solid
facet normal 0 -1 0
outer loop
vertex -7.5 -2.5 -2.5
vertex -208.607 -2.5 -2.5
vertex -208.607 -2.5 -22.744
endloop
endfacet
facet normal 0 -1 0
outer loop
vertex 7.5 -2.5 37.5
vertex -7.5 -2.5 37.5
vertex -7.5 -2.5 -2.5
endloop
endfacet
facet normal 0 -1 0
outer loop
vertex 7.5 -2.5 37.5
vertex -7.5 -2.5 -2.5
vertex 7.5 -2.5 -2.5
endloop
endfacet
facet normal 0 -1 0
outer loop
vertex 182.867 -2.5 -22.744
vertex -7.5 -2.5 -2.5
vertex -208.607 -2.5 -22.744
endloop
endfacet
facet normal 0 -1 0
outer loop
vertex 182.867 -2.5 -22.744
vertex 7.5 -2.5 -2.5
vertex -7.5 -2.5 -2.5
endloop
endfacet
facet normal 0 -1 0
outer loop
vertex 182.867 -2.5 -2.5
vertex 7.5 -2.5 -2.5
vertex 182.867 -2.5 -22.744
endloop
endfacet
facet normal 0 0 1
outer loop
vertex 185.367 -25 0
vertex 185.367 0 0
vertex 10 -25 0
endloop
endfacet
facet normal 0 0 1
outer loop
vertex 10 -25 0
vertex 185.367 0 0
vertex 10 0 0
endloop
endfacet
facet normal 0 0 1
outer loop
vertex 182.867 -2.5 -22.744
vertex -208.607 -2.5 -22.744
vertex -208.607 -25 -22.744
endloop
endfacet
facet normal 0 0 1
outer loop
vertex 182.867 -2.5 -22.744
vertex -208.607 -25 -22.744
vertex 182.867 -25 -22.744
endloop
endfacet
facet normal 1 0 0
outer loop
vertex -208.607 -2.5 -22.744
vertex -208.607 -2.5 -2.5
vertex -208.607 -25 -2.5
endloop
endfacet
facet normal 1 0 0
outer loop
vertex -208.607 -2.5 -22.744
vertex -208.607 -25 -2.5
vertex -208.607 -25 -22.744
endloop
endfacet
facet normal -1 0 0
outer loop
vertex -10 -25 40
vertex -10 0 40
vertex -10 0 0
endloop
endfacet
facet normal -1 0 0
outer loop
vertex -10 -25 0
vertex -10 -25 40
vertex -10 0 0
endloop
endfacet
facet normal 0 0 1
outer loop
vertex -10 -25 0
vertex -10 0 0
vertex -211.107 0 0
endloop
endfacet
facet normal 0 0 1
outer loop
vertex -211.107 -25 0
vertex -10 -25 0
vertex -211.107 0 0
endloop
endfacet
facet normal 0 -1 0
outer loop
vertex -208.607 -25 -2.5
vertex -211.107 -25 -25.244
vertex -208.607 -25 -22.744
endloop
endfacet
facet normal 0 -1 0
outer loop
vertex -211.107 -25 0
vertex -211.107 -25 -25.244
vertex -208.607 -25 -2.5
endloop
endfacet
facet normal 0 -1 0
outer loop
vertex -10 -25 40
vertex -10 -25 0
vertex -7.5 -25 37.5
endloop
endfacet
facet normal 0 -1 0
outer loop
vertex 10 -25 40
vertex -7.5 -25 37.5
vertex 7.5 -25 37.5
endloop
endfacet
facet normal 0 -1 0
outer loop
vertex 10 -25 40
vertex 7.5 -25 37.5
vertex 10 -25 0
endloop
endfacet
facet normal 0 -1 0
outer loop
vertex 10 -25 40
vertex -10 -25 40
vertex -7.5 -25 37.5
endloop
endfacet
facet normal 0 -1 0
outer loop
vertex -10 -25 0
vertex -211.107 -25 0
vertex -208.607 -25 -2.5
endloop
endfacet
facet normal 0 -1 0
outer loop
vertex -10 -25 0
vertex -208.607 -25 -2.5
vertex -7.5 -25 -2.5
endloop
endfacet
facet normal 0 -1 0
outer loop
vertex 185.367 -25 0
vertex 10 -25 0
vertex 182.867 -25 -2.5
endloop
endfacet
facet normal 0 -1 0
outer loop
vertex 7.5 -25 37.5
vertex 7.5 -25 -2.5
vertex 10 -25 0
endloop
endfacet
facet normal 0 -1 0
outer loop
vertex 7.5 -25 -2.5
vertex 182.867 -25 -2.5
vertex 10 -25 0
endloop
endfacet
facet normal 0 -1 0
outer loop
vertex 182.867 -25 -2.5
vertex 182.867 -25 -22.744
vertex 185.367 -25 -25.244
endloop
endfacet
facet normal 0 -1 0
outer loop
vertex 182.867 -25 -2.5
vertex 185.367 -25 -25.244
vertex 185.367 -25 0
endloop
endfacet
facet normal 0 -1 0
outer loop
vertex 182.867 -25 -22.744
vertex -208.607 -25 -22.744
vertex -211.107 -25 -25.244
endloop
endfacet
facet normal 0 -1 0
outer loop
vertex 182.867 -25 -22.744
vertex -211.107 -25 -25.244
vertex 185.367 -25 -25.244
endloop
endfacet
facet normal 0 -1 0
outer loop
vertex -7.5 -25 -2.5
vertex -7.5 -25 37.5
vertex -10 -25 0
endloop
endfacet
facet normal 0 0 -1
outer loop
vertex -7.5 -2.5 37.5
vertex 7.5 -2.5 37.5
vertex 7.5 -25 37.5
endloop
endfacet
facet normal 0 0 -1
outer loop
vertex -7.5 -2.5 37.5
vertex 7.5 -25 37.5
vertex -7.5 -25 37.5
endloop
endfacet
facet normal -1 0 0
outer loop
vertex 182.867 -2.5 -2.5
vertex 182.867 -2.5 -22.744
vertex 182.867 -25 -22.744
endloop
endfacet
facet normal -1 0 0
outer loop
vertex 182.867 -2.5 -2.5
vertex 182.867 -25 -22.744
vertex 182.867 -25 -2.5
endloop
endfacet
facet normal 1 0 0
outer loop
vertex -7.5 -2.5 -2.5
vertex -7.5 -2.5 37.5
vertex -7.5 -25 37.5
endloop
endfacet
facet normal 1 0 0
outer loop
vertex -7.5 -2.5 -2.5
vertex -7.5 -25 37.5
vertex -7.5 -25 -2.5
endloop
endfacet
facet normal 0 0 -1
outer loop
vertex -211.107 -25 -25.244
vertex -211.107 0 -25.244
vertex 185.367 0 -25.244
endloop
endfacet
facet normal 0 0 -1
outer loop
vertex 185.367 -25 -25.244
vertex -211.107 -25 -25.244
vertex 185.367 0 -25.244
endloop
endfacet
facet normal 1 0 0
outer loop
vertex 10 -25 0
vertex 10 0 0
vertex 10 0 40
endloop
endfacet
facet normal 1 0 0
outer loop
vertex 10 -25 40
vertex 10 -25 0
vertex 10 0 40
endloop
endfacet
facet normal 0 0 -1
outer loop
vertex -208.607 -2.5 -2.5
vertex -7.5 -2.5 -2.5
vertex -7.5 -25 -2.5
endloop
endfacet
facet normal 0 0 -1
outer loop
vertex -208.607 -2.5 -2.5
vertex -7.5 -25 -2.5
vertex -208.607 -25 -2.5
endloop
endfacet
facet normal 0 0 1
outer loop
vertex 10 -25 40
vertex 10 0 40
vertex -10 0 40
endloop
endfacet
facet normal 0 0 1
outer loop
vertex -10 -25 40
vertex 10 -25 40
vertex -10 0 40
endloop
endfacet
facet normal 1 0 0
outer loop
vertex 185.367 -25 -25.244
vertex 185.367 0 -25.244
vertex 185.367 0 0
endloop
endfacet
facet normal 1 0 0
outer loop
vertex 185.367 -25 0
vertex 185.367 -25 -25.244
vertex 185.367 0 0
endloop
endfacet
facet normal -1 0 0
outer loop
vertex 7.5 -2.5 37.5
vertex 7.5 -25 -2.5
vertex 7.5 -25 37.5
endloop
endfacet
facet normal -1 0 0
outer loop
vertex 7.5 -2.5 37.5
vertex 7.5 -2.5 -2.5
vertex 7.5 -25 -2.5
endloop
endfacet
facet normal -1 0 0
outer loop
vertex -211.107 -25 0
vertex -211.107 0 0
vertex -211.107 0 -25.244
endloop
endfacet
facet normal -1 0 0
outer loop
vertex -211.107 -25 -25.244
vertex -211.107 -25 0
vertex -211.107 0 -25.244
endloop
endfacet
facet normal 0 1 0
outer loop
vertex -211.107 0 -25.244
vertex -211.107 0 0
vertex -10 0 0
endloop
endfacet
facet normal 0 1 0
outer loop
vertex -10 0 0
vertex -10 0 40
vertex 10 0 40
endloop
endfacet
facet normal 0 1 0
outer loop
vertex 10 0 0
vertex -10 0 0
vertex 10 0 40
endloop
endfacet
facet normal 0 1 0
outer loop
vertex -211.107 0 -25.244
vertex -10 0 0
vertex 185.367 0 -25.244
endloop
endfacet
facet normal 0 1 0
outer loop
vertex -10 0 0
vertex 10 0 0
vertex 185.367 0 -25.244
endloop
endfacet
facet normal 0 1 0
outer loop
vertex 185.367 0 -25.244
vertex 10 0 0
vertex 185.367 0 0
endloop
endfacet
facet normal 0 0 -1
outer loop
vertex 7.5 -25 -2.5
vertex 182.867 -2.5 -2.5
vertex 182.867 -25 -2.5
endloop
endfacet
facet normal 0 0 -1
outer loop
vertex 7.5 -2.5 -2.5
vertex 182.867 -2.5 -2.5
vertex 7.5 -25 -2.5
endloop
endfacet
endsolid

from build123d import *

# Parameters (mm, degrees)
F1_DEPTH = 25
F2_T     = -2.5


with BuildPart() as f1:
    # F0 (on Front) → F1 (new body)
    with BuildSketch(Plane.XZ):
        Polygon((10, 40), (-10, 40), (-10, 0), (-211.1074434719, 0), (-211.1074434719, -25.2444452331), (185.367203297, -25.2444452331), (185.367203297, 0), (10, 0), align=None)
    extrude(amount=F1_DEPTH)

    # F2
    f2_openings = [f1.faces().sort_by_distance(p)[0] for p in [
        (-11.917552, -25, -10.207725),
    ]]
    offset(amount=F2_T, openings=f2_openings, kind=Kind.INTERSECTION)


solid = f1.part
